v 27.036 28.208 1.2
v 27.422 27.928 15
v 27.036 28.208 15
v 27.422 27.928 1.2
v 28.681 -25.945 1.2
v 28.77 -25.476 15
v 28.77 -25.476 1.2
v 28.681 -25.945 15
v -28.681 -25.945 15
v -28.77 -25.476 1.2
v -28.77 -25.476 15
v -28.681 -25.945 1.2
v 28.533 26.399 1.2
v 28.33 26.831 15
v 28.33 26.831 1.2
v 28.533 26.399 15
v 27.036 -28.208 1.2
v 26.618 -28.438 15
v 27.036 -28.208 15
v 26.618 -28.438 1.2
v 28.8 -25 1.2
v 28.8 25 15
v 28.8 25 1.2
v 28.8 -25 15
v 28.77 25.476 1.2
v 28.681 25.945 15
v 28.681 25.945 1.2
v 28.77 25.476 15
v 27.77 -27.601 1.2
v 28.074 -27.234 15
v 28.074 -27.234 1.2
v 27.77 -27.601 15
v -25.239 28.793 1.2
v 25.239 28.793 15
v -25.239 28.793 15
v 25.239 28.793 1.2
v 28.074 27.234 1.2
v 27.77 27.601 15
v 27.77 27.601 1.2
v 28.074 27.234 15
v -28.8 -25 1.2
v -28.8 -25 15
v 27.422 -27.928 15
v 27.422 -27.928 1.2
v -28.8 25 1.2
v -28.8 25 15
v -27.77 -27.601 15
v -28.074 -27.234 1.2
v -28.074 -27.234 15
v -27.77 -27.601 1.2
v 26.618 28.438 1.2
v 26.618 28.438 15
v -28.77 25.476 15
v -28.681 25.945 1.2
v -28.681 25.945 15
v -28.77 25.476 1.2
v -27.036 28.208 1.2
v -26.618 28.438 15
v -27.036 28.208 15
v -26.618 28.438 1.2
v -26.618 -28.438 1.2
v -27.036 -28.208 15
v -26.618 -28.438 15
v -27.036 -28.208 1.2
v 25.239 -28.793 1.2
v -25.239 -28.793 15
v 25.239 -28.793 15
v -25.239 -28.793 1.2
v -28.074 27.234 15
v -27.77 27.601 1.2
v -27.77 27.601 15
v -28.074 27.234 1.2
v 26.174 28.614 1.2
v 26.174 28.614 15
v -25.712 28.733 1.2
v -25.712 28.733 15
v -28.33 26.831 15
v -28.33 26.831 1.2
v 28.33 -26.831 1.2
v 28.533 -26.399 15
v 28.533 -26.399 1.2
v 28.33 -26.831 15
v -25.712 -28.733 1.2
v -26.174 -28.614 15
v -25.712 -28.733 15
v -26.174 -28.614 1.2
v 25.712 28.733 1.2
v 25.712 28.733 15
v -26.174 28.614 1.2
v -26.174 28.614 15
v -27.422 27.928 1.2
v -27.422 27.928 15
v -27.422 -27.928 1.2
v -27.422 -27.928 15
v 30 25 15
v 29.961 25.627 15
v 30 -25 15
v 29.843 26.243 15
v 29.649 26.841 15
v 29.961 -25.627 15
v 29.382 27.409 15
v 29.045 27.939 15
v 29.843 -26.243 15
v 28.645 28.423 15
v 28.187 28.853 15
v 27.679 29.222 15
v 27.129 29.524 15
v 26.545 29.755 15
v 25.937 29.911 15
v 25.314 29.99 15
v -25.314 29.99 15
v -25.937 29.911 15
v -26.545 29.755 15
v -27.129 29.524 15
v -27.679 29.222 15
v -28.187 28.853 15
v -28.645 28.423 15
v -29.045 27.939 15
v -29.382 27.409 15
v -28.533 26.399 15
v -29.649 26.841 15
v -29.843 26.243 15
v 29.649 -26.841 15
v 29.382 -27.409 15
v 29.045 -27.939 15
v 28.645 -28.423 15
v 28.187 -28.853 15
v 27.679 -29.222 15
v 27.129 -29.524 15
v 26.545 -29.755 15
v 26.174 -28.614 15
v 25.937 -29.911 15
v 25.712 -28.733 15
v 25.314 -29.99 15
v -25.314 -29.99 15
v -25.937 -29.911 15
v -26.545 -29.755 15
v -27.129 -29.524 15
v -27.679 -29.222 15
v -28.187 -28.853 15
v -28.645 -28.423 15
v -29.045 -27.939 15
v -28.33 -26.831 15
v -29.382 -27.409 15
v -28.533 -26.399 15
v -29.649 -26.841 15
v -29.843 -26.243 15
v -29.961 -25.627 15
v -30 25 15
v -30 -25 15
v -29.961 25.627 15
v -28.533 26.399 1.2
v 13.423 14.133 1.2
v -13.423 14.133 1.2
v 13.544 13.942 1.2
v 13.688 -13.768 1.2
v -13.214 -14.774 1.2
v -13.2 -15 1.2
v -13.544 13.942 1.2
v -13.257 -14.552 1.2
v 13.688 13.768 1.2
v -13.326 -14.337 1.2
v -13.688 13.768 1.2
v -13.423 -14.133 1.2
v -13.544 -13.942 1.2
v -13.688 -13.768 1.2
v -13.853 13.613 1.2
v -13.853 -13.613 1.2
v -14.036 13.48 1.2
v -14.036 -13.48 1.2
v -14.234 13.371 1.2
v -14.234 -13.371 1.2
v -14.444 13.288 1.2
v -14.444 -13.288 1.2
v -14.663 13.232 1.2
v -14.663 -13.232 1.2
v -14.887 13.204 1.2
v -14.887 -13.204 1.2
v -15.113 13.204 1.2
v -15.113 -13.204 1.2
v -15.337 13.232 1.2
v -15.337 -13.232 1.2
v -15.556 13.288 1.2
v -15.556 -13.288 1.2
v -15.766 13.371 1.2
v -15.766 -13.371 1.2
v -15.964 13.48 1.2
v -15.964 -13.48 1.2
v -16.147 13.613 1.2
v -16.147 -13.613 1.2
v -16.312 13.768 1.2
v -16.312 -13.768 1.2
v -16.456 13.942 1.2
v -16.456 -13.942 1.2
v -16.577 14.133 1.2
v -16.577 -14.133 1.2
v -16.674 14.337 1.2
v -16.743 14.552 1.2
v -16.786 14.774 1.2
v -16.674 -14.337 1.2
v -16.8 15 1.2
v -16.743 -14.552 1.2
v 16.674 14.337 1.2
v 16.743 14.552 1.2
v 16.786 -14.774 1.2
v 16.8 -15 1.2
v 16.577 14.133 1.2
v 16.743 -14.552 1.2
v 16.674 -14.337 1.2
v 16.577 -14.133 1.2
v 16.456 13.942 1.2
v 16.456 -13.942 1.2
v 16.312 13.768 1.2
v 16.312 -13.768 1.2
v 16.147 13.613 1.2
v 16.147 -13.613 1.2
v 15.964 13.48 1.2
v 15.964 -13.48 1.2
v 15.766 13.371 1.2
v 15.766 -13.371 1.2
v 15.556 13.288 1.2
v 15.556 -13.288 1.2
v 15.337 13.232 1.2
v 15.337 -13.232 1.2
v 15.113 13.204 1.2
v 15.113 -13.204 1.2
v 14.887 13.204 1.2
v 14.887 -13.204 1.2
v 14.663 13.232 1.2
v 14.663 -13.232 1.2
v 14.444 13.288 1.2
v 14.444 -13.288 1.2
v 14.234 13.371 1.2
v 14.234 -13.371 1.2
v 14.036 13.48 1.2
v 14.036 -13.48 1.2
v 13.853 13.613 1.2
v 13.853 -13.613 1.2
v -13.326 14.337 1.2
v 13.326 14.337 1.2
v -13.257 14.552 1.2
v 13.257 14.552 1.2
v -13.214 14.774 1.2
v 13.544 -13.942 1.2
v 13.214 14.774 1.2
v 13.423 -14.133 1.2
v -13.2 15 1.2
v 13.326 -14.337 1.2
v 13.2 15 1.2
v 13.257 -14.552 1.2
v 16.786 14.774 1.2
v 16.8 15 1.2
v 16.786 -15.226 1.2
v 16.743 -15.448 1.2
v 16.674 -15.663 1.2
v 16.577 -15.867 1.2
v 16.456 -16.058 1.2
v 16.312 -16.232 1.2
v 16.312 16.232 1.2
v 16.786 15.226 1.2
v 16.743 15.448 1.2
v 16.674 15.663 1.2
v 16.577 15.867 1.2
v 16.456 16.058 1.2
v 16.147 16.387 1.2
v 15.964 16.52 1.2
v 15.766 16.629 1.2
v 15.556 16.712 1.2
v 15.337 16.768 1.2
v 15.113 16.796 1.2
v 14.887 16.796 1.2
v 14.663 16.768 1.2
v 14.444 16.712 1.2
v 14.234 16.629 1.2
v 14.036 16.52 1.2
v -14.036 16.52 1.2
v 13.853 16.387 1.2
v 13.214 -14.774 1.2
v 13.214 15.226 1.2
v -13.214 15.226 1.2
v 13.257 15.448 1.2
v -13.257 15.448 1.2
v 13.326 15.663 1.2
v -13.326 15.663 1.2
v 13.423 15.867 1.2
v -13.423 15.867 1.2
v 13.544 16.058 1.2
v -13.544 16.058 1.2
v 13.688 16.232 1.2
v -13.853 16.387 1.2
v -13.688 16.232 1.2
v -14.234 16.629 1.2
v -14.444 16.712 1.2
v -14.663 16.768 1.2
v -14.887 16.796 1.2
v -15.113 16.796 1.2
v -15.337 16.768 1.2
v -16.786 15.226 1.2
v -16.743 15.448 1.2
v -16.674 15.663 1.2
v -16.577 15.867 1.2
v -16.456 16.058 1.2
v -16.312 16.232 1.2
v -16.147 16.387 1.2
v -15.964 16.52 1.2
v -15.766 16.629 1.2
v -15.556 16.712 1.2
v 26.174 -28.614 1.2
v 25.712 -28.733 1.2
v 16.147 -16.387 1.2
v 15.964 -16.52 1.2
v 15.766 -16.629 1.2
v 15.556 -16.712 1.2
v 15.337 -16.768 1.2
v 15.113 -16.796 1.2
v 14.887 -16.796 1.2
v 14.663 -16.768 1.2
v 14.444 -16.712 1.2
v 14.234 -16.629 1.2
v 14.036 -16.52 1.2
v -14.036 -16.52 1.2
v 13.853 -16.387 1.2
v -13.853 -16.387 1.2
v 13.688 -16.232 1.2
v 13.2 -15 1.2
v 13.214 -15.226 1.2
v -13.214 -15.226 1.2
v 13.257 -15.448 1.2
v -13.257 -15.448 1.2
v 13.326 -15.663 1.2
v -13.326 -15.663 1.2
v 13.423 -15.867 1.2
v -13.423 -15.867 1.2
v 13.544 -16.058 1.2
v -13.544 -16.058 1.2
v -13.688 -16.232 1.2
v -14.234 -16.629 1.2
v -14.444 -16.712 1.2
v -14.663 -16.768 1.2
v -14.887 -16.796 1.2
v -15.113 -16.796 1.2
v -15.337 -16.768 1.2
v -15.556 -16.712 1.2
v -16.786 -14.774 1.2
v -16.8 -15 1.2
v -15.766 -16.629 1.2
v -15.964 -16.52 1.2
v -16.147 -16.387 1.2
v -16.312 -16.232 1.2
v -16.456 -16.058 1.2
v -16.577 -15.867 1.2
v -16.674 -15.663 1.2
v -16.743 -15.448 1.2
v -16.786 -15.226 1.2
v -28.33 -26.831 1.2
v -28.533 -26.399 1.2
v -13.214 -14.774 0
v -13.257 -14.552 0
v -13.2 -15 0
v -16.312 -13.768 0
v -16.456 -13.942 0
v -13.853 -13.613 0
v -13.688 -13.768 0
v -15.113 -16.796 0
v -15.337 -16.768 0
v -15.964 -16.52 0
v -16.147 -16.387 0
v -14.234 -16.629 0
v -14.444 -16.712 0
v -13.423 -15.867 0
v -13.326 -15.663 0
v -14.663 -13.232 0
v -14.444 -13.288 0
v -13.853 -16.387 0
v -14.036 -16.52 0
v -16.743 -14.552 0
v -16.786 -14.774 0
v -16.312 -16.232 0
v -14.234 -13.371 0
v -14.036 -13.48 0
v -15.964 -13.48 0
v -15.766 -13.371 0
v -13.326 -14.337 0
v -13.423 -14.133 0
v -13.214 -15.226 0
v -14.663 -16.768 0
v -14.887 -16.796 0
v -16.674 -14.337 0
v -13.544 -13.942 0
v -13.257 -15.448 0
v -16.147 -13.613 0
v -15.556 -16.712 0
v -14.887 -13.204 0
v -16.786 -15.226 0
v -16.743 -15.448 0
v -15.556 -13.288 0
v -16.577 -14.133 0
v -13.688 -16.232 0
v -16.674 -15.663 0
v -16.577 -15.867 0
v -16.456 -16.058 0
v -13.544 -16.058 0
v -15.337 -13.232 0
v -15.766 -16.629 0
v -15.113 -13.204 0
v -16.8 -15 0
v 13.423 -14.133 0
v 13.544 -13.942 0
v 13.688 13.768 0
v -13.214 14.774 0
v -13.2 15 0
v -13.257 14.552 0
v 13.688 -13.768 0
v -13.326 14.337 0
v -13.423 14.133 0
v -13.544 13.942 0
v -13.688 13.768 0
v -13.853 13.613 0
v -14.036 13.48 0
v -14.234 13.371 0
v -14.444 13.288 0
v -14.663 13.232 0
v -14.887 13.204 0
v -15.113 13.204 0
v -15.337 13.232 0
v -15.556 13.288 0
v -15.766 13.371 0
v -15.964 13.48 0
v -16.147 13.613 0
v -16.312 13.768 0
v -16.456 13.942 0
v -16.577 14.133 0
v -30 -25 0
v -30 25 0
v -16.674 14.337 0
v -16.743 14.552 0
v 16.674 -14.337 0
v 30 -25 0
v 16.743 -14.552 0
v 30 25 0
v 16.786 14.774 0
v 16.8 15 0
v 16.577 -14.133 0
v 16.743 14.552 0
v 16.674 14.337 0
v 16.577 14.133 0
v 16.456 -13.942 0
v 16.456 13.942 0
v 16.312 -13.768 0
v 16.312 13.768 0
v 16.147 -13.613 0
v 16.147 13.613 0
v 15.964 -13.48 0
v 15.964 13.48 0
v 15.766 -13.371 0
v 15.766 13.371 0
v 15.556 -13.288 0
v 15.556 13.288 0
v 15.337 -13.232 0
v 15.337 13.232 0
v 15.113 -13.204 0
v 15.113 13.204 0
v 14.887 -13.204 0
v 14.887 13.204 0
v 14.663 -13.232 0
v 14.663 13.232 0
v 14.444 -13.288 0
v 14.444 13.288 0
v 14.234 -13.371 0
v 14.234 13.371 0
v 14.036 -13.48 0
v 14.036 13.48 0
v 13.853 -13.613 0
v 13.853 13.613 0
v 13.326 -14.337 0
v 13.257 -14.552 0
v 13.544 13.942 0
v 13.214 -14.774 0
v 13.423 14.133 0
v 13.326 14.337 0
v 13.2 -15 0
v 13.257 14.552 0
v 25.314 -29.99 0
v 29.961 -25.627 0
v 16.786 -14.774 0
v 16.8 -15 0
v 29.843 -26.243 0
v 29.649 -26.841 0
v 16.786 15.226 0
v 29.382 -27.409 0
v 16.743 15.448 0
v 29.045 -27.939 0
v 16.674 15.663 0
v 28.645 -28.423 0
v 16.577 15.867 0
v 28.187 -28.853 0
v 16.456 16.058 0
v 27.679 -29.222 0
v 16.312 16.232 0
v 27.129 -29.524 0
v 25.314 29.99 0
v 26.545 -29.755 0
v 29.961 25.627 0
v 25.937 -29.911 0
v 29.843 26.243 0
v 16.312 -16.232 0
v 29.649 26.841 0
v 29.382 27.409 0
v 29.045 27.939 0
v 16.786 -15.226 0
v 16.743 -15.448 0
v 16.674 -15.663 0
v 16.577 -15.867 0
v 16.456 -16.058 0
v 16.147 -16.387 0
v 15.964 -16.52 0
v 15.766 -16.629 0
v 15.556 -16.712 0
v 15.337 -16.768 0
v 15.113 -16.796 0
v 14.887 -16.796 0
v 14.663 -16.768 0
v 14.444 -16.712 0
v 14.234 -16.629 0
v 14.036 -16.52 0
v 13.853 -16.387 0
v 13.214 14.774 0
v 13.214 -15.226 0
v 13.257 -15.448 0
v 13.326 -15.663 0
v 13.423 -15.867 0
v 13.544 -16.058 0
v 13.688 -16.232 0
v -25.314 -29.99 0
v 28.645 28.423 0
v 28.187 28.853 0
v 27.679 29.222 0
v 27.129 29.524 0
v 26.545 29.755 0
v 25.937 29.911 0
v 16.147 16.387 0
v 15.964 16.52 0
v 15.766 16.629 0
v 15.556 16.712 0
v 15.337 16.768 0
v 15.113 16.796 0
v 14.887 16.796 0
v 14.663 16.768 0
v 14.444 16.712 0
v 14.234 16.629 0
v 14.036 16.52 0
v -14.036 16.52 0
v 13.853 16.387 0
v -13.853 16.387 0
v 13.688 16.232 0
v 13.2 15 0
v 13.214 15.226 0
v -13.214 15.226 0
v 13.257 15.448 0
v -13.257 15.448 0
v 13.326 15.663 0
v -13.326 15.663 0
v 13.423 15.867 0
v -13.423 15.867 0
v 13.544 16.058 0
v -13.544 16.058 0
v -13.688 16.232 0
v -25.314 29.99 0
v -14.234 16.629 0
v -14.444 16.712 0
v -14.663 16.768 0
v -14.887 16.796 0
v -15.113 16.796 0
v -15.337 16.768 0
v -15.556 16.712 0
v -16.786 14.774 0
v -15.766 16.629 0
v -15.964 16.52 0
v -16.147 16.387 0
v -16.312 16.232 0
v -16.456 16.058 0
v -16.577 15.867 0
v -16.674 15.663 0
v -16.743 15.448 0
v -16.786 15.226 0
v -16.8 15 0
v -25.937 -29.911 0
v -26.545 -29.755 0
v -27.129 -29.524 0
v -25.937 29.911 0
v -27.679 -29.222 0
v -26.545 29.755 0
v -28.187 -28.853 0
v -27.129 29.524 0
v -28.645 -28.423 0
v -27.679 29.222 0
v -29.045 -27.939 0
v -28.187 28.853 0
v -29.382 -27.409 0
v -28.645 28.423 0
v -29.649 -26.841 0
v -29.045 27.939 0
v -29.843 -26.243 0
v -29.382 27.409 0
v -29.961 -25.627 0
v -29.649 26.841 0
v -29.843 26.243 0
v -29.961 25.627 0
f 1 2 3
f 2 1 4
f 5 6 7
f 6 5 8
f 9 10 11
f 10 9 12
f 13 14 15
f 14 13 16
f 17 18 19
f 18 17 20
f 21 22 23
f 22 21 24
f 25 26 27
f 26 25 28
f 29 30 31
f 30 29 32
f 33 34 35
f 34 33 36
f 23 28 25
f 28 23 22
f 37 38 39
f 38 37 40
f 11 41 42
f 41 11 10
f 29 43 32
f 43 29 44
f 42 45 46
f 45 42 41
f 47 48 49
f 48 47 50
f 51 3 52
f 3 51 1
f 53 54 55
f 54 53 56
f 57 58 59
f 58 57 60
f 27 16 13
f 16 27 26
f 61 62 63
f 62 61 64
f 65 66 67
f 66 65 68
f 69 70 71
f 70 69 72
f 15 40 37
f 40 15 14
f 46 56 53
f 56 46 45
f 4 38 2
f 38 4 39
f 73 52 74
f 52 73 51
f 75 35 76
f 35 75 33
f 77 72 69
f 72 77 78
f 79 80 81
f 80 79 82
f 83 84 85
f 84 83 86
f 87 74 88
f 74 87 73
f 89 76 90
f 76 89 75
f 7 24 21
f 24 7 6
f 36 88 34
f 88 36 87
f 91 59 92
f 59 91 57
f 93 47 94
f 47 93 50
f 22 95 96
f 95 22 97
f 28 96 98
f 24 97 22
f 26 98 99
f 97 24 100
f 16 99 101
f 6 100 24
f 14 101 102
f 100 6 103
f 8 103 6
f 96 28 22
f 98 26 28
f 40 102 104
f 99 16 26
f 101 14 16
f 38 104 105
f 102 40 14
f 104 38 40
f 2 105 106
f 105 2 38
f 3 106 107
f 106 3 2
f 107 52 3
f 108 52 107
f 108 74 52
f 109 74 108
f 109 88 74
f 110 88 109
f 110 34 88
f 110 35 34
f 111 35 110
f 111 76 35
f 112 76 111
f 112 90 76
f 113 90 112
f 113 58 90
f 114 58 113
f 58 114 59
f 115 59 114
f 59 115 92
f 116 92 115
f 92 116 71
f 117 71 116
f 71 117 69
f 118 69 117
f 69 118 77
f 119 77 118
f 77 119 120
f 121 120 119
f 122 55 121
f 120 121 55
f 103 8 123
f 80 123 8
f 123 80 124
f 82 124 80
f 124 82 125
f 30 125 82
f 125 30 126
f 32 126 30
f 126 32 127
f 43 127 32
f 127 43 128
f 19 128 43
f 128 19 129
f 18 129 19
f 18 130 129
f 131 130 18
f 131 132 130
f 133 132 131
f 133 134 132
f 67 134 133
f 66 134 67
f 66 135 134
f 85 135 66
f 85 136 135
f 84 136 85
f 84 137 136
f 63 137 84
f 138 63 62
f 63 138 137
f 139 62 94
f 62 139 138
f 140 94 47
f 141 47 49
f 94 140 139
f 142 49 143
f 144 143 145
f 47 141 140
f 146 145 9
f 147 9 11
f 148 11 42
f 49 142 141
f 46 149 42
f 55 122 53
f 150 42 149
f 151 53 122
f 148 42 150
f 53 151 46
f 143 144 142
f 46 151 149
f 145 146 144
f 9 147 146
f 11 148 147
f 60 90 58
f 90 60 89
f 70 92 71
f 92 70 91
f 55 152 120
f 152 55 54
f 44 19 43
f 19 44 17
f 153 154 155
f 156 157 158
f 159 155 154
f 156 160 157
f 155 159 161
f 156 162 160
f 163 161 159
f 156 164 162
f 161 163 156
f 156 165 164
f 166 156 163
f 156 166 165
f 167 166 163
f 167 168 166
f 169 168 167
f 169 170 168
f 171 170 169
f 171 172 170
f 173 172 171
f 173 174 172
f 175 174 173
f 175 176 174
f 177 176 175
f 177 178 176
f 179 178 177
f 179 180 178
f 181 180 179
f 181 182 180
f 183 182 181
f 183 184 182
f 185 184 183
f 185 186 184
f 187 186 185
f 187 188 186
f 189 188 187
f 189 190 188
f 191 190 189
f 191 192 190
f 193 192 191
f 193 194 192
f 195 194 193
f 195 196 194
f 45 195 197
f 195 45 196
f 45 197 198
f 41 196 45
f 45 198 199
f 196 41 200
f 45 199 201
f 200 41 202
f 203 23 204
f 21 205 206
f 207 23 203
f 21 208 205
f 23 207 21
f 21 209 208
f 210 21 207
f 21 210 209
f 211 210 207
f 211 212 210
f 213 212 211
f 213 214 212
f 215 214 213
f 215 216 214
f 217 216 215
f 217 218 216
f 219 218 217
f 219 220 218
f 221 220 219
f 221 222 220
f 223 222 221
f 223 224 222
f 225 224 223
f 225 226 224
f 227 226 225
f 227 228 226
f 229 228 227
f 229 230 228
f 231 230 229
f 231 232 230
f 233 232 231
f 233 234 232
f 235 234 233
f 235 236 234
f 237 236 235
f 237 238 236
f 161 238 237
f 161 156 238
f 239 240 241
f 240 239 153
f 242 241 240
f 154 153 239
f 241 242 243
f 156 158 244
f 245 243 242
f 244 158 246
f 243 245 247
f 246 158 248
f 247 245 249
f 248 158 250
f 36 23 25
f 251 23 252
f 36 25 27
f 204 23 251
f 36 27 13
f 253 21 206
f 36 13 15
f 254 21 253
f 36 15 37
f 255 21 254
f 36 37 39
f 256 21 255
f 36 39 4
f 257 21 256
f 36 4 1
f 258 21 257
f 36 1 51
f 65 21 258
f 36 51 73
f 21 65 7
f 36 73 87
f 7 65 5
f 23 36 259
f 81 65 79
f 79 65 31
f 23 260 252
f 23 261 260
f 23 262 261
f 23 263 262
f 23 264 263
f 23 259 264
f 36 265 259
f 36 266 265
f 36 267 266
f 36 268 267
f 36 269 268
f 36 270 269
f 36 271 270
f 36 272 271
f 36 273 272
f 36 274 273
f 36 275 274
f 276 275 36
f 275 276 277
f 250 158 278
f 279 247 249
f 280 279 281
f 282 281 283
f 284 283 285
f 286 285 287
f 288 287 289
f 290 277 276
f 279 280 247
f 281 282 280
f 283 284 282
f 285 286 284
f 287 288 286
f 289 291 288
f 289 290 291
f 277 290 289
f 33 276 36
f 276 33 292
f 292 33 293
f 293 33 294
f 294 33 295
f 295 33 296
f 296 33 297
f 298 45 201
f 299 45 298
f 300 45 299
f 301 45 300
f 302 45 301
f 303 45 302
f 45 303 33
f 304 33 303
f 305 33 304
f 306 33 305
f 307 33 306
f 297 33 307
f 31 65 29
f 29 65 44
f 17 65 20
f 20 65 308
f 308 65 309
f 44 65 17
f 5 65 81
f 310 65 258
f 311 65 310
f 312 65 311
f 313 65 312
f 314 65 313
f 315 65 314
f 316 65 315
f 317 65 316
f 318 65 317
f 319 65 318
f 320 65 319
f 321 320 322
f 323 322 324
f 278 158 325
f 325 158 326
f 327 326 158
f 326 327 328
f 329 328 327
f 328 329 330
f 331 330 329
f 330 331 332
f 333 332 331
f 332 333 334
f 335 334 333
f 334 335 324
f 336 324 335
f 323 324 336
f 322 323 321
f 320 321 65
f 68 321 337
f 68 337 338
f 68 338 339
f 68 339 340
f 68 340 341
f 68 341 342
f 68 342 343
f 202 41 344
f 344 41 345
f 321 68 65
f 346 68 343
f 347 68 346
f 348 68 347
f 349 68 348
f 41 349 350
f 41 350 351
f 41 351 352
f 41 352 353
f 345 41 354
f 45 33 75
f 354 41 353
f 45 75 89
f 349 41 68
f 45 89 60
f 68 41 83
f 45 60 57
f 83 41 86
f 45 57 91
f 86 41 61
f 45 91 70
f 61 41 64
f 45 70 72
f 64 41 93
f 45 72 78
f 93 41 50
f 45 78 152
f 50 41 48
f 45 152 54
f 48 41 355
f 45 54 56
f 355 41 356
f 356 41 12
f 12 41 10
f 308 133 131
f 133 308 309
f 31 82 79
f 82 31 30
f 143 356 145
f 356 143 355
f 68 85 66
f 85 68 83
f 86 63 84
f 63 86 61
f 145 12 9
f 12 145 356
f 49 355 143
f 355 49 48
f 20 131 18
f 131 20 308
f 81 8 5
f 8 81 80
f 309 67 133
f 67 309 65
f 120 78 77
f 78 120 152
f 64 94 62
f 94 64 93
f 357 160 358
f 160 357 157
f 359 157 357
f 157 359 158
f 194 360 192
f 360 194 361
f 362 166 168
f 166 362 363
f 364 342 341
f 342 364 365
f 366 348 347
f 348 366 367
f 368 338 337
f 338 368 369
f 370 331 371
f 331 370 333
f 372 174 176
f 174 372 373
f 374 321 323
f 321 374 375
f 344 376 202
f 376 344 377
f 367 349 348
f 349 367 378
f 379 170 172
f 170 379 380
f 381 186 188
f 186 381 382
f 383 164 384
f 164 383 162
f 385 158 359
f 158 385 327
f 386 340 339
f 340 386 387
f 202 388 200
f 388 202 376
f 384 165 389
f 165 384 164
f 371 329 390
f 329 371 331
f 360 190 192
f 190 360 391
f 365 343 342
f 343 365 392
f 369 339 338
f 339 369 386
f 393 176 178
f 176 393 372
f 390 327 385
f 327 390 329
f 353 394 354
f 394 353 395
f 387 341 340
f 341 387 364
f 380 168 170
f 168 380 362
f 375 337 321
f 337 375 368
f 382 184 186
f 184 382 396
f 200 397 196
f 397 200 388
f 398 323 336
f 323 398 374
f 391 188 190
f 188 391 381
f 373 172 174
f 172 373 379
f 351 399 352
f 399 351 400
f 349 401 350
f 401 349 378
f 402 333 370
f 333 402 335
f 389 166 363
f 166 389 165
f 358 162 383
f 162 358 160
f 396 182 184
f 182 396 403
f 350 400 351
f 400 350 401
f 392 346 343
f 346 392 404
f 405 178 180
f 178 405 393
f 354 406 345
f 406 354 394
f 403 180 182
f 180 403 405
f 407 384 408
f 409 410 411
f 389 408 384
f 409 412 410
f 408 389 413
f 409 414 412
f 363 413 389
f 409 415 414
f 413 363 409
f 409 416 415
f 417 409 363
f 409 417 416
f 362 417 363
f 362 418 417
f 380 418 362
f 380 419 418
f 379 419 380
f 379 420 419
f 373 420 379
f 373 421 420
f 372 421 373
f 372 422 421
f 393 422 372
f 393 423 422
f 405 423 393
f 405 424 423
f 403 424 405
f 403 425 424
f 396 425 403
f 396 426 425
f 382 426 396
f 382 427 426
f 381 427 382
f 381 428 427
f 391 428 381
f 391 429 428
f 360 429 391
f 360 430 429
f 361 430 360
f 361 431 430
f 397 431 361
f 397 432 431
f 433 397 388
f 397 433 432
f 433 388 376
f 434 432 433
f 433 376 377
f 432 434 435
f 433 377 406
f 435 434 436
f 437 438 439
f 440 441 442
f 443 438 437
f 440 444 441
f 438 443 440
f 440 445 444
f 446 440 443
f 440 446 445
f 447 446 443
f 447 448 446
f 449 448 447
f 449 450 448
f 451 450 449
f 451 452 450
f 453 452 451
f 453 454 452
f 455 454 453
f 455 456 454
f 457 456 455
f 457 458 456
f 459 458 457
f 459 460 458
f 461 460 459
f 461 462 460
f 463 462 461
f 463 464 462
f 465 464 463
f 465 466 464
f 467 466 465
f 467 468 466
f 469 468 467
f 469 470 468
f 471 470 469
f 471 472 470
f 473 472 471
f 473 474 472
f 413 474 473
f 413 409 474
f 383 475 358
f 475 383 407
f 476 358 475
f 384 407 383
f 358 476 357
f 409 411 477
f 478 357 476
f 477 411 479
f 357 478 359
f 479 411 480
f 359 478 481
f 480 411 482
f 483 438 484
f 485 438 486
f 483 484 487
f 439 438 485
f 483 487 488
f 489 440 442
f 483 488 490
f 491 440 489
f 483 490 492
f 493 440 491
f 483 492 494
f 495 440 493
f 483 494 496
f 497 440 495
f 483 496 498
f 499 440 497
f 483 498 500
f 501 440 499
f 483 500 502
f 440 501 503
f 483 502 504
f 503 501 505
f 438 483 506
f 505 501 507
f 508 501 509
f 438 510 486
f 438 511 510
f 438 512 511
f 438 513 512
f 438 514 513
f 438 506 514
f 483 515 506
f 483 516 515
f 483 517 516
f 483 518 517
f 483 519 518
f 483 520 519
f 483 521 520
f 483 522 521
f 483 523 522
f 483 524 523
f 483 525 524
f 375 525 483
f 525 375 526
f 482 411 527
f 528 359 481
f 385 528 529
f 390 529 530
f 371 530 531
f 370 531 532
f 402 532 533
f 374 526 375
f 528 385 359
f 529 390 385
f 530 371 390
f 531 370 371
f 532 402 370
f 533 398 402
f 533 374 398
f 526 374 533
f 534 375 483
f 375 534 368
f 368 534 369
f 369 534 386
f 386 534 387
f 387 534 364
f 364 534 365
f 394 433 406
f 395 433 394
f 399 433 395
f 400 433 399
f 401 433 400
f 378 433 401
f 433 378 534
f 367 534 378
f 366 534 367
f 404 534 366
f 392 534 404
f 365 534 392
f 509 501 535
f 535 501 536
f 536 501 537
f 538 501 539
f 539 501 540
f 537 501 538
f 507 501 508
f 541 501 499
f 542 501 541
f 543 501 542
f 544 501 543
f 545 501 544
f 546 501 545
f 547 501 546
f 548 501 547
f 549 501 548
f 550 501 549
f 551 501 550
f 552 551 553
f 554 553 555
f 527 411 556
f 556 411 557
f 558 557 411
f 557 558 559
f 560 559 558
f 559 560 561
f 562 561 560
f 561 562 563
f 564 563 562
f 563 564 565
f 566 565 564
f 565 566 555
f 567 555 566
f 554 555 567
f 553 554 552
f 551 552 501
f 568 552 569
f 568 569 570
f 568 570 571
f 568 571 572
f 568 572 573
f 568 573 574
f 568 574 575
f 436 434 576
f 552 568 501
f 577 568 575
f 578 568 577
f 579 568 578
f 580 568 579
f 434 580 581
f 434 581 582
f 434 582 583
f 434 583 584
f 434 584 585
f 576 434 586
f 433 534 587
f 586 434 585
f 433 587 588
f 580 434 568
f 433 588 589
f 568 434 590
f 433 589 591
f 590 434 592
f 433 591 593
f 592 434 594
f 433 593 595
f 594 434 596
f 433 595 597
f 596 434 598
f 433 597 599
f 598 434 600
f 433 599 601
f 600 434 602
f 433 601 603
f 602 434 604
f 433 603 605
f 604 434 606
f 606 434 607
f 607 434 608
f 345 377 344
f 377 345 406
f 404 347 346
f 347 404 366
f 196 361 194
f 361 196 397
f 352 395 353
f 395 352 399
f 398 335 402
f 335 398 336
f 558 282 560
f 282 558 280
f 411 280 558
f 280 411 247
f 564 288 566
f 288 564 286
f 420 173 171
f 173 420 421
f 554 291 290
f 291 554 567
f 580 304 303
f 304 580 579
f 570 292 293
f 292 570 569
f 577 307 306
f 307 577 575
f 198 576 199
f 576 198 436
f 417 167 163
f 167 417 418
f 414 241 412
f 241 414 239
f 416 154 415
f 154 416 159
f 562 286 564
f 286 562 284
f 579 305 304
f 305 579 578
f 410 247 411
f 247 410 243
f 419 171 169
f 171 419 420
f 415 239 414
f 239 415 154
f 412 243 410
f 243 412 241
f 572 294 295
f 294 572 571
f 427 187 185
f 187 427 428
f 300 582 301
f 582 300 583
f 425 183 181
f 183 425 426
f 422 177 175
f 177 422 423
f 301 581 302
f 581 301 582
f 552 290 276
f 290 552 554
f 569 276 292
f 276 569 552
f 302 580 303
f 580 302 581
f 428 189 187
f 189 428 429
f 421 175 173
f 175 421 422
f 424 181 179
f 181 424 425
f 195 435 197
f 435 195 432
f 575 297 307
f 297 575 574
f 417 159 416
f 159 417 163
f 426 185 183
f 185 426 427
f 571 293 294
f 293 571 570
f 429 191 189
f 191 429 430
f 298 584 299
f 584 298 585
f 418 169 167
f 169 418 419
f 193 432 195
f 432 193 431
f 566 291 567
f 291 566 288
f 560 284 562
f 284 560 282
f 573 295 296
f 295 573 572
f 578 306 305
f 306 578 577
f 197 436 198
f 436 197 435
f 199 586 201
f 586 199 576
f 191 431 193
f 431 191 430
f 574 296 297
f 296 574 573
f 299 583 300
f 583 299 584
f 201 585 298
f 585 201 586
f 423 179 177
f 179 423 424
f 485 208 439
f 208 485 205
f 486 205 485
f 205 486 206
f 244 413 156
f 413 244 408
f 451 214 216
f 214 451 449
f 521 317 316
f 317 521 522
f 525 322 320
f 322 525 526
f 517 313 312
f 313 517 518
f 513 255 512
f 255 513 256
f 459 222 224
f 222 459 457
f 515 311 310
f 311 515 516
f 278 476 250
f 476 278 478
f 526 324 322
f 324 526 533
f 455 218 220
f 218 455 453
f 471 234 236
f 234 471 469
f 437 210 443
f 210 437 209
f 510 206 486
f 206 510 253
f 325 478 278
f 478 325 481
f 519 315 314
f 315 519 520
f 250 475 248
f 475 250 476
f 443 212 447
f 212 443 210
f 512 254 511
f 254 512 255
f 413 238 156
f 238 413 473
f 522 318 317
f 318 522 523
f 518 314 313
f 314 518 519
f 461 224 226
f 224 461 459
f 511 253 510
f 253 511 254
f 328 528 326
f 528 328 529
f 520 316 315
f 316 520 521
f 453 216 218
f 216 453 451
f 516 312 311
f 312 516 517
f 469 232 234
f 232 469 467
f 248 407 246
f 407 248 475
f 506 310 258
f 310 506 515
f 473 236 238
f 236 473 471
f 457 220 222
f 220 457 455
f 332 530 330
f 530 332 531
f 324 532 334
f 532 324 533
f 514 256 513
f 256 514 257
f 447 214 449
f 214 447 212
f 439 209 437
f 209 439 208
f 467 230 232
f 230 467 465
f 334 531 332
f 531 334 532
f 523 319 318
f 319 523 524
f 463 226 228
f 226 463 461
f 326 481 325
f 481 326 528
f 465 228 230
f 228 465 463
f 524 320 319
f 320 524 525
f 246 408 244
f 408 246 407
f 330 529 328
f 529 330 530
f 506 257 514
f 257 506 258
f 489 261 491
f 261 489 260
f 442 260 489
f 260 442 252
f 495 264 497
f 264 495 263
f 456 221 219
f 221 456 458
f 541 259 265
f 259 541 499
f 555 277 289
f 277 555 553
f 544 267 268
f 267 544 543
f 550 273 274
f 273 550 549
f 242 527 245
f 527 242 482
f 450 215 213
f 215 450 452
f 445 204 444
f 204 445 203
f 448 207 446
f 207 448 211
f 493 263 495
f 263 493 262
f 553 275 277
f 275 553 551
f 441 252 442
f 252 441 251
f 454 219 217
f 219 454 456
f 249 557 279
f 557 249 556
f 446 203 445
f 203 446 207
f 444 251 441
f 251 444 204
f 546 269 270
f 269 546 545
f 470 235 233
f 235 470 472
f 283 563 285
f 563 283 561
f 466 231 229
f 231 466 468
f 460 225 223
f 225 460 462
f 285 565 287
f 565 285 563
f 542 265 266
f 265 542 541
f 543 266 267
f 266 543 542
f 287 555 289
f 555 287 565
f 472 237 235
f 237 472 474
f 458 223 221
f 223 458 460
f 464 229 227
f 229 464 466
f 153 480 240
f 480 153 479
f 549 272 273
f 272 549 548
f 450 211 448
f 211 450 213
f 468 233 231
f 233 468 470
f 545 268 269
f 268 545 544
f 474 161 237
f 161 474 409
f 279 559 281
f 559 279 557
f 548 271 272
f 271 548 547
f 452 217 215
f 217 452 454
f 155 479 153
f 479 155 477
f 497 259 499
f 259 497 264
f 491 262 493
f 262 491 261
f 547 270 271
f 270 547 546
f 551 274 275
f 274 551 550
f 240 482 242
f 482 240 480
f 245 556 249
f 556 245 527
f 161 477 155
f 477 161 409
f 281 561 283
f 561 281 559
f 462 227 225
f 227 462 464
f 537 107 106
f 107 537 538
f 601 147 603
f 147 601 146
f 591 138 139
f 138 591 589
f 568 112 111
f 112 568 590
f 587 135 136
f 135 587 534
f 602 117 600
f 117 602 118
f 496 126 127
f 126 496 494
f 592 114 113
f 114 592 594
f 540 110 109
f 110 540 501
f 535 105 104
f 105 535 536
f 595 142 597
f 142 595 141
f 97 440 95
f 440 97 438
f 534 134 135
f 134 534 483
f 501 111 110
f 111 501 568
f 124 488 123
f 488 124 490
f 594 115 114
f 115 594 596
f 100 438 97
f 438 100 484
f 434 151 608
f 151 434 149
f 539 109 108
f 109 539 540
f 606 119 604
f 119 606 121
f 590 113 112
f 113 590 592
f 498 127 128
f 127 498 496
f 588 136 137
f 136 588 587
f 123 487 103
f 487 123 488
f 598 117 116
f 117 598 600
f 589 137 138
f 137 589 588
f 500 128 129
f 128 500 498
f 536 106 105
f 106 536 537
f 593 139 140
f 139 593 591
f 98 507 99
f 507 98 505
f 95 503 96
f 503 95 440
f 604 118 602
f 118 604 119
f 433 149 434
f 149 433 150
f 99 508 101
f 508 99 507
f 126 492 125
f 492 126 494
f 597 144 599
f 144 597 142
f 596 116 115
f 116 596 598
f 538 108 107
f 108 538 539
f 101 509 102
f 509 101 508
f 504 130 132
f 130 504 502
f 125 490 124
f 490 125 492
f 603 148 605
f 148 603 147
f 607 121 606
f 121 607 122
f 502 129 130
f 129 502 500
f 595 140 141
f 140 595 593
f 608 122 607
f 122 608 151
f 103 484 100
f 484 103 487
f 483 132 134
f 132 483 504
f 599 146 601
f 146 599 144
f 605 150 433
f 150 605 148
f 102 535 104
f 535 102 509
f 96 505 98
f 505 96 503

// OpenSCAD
$fn = 50;


difference() {
	union() {
		hull() {
			translate(v = [-25.0000000000, 25.0000000000, 0]) {
				cylinder(h = 15, r = 5);
			}
			translate(v = [25.0000000000, 25.0000000000, 0]) {
				cylinder(h = 15, r = 5);
			}
			translate(v = [-25.0000000000, -25.0000000000, 0]) {
				cylinder(h = 15, r = 5);
			}
			translate(v = [25.0000000000, -25.0000000000, 0]) {
				cylinder(h = 15, r = 5);
			}
		}
	}
	union() {
		translate(v = [0, 0, 1.2000000000]) {
			hull() {
				translate(v = [-25.0000000000, 25.0000000000, 0]) {
					cylinder(h = 13.8000000000, r = 3.8000000000);
				}
				translate(v = [25.0000000000, 25.0000000000, 0]) {
					cylinder(h = 13.8000000000, r = 3.8000000000);
				}
				translate(v = [-25.0000000000, -25.0000000000, 0]) {
					cylinder(h = 13.8000000000, r = 3.8000000000);
				}
				translate(v = [25.0000000000, -25.0000000000, 0]) {
					cylinder(h = 13.8000000000, r = 3.8000000000);
				}
			}
		}
		#translate(v = [-15.0000000000, -15.0000000000, 0]) {
			cylinder(h = 1.2000000000, r = 1.8000000000);
		}
		#translate(v = [-15.0000000000, 15.0000000000, 0]) {
			cylinder(h = 1.2000000000, r = 1.8000000000);
		}
		#translate(v = [15.0000000000, -15.0000000000, 0]) {
			cylinder(h = 1.2000000000, r = 1.8000000000);
		}
		#translate(v = [15.0000000000, 15.0000000000, 0]) {
			cylinder(h = 1.2000000000, r = 1.8000000000);
		}
	}
}
